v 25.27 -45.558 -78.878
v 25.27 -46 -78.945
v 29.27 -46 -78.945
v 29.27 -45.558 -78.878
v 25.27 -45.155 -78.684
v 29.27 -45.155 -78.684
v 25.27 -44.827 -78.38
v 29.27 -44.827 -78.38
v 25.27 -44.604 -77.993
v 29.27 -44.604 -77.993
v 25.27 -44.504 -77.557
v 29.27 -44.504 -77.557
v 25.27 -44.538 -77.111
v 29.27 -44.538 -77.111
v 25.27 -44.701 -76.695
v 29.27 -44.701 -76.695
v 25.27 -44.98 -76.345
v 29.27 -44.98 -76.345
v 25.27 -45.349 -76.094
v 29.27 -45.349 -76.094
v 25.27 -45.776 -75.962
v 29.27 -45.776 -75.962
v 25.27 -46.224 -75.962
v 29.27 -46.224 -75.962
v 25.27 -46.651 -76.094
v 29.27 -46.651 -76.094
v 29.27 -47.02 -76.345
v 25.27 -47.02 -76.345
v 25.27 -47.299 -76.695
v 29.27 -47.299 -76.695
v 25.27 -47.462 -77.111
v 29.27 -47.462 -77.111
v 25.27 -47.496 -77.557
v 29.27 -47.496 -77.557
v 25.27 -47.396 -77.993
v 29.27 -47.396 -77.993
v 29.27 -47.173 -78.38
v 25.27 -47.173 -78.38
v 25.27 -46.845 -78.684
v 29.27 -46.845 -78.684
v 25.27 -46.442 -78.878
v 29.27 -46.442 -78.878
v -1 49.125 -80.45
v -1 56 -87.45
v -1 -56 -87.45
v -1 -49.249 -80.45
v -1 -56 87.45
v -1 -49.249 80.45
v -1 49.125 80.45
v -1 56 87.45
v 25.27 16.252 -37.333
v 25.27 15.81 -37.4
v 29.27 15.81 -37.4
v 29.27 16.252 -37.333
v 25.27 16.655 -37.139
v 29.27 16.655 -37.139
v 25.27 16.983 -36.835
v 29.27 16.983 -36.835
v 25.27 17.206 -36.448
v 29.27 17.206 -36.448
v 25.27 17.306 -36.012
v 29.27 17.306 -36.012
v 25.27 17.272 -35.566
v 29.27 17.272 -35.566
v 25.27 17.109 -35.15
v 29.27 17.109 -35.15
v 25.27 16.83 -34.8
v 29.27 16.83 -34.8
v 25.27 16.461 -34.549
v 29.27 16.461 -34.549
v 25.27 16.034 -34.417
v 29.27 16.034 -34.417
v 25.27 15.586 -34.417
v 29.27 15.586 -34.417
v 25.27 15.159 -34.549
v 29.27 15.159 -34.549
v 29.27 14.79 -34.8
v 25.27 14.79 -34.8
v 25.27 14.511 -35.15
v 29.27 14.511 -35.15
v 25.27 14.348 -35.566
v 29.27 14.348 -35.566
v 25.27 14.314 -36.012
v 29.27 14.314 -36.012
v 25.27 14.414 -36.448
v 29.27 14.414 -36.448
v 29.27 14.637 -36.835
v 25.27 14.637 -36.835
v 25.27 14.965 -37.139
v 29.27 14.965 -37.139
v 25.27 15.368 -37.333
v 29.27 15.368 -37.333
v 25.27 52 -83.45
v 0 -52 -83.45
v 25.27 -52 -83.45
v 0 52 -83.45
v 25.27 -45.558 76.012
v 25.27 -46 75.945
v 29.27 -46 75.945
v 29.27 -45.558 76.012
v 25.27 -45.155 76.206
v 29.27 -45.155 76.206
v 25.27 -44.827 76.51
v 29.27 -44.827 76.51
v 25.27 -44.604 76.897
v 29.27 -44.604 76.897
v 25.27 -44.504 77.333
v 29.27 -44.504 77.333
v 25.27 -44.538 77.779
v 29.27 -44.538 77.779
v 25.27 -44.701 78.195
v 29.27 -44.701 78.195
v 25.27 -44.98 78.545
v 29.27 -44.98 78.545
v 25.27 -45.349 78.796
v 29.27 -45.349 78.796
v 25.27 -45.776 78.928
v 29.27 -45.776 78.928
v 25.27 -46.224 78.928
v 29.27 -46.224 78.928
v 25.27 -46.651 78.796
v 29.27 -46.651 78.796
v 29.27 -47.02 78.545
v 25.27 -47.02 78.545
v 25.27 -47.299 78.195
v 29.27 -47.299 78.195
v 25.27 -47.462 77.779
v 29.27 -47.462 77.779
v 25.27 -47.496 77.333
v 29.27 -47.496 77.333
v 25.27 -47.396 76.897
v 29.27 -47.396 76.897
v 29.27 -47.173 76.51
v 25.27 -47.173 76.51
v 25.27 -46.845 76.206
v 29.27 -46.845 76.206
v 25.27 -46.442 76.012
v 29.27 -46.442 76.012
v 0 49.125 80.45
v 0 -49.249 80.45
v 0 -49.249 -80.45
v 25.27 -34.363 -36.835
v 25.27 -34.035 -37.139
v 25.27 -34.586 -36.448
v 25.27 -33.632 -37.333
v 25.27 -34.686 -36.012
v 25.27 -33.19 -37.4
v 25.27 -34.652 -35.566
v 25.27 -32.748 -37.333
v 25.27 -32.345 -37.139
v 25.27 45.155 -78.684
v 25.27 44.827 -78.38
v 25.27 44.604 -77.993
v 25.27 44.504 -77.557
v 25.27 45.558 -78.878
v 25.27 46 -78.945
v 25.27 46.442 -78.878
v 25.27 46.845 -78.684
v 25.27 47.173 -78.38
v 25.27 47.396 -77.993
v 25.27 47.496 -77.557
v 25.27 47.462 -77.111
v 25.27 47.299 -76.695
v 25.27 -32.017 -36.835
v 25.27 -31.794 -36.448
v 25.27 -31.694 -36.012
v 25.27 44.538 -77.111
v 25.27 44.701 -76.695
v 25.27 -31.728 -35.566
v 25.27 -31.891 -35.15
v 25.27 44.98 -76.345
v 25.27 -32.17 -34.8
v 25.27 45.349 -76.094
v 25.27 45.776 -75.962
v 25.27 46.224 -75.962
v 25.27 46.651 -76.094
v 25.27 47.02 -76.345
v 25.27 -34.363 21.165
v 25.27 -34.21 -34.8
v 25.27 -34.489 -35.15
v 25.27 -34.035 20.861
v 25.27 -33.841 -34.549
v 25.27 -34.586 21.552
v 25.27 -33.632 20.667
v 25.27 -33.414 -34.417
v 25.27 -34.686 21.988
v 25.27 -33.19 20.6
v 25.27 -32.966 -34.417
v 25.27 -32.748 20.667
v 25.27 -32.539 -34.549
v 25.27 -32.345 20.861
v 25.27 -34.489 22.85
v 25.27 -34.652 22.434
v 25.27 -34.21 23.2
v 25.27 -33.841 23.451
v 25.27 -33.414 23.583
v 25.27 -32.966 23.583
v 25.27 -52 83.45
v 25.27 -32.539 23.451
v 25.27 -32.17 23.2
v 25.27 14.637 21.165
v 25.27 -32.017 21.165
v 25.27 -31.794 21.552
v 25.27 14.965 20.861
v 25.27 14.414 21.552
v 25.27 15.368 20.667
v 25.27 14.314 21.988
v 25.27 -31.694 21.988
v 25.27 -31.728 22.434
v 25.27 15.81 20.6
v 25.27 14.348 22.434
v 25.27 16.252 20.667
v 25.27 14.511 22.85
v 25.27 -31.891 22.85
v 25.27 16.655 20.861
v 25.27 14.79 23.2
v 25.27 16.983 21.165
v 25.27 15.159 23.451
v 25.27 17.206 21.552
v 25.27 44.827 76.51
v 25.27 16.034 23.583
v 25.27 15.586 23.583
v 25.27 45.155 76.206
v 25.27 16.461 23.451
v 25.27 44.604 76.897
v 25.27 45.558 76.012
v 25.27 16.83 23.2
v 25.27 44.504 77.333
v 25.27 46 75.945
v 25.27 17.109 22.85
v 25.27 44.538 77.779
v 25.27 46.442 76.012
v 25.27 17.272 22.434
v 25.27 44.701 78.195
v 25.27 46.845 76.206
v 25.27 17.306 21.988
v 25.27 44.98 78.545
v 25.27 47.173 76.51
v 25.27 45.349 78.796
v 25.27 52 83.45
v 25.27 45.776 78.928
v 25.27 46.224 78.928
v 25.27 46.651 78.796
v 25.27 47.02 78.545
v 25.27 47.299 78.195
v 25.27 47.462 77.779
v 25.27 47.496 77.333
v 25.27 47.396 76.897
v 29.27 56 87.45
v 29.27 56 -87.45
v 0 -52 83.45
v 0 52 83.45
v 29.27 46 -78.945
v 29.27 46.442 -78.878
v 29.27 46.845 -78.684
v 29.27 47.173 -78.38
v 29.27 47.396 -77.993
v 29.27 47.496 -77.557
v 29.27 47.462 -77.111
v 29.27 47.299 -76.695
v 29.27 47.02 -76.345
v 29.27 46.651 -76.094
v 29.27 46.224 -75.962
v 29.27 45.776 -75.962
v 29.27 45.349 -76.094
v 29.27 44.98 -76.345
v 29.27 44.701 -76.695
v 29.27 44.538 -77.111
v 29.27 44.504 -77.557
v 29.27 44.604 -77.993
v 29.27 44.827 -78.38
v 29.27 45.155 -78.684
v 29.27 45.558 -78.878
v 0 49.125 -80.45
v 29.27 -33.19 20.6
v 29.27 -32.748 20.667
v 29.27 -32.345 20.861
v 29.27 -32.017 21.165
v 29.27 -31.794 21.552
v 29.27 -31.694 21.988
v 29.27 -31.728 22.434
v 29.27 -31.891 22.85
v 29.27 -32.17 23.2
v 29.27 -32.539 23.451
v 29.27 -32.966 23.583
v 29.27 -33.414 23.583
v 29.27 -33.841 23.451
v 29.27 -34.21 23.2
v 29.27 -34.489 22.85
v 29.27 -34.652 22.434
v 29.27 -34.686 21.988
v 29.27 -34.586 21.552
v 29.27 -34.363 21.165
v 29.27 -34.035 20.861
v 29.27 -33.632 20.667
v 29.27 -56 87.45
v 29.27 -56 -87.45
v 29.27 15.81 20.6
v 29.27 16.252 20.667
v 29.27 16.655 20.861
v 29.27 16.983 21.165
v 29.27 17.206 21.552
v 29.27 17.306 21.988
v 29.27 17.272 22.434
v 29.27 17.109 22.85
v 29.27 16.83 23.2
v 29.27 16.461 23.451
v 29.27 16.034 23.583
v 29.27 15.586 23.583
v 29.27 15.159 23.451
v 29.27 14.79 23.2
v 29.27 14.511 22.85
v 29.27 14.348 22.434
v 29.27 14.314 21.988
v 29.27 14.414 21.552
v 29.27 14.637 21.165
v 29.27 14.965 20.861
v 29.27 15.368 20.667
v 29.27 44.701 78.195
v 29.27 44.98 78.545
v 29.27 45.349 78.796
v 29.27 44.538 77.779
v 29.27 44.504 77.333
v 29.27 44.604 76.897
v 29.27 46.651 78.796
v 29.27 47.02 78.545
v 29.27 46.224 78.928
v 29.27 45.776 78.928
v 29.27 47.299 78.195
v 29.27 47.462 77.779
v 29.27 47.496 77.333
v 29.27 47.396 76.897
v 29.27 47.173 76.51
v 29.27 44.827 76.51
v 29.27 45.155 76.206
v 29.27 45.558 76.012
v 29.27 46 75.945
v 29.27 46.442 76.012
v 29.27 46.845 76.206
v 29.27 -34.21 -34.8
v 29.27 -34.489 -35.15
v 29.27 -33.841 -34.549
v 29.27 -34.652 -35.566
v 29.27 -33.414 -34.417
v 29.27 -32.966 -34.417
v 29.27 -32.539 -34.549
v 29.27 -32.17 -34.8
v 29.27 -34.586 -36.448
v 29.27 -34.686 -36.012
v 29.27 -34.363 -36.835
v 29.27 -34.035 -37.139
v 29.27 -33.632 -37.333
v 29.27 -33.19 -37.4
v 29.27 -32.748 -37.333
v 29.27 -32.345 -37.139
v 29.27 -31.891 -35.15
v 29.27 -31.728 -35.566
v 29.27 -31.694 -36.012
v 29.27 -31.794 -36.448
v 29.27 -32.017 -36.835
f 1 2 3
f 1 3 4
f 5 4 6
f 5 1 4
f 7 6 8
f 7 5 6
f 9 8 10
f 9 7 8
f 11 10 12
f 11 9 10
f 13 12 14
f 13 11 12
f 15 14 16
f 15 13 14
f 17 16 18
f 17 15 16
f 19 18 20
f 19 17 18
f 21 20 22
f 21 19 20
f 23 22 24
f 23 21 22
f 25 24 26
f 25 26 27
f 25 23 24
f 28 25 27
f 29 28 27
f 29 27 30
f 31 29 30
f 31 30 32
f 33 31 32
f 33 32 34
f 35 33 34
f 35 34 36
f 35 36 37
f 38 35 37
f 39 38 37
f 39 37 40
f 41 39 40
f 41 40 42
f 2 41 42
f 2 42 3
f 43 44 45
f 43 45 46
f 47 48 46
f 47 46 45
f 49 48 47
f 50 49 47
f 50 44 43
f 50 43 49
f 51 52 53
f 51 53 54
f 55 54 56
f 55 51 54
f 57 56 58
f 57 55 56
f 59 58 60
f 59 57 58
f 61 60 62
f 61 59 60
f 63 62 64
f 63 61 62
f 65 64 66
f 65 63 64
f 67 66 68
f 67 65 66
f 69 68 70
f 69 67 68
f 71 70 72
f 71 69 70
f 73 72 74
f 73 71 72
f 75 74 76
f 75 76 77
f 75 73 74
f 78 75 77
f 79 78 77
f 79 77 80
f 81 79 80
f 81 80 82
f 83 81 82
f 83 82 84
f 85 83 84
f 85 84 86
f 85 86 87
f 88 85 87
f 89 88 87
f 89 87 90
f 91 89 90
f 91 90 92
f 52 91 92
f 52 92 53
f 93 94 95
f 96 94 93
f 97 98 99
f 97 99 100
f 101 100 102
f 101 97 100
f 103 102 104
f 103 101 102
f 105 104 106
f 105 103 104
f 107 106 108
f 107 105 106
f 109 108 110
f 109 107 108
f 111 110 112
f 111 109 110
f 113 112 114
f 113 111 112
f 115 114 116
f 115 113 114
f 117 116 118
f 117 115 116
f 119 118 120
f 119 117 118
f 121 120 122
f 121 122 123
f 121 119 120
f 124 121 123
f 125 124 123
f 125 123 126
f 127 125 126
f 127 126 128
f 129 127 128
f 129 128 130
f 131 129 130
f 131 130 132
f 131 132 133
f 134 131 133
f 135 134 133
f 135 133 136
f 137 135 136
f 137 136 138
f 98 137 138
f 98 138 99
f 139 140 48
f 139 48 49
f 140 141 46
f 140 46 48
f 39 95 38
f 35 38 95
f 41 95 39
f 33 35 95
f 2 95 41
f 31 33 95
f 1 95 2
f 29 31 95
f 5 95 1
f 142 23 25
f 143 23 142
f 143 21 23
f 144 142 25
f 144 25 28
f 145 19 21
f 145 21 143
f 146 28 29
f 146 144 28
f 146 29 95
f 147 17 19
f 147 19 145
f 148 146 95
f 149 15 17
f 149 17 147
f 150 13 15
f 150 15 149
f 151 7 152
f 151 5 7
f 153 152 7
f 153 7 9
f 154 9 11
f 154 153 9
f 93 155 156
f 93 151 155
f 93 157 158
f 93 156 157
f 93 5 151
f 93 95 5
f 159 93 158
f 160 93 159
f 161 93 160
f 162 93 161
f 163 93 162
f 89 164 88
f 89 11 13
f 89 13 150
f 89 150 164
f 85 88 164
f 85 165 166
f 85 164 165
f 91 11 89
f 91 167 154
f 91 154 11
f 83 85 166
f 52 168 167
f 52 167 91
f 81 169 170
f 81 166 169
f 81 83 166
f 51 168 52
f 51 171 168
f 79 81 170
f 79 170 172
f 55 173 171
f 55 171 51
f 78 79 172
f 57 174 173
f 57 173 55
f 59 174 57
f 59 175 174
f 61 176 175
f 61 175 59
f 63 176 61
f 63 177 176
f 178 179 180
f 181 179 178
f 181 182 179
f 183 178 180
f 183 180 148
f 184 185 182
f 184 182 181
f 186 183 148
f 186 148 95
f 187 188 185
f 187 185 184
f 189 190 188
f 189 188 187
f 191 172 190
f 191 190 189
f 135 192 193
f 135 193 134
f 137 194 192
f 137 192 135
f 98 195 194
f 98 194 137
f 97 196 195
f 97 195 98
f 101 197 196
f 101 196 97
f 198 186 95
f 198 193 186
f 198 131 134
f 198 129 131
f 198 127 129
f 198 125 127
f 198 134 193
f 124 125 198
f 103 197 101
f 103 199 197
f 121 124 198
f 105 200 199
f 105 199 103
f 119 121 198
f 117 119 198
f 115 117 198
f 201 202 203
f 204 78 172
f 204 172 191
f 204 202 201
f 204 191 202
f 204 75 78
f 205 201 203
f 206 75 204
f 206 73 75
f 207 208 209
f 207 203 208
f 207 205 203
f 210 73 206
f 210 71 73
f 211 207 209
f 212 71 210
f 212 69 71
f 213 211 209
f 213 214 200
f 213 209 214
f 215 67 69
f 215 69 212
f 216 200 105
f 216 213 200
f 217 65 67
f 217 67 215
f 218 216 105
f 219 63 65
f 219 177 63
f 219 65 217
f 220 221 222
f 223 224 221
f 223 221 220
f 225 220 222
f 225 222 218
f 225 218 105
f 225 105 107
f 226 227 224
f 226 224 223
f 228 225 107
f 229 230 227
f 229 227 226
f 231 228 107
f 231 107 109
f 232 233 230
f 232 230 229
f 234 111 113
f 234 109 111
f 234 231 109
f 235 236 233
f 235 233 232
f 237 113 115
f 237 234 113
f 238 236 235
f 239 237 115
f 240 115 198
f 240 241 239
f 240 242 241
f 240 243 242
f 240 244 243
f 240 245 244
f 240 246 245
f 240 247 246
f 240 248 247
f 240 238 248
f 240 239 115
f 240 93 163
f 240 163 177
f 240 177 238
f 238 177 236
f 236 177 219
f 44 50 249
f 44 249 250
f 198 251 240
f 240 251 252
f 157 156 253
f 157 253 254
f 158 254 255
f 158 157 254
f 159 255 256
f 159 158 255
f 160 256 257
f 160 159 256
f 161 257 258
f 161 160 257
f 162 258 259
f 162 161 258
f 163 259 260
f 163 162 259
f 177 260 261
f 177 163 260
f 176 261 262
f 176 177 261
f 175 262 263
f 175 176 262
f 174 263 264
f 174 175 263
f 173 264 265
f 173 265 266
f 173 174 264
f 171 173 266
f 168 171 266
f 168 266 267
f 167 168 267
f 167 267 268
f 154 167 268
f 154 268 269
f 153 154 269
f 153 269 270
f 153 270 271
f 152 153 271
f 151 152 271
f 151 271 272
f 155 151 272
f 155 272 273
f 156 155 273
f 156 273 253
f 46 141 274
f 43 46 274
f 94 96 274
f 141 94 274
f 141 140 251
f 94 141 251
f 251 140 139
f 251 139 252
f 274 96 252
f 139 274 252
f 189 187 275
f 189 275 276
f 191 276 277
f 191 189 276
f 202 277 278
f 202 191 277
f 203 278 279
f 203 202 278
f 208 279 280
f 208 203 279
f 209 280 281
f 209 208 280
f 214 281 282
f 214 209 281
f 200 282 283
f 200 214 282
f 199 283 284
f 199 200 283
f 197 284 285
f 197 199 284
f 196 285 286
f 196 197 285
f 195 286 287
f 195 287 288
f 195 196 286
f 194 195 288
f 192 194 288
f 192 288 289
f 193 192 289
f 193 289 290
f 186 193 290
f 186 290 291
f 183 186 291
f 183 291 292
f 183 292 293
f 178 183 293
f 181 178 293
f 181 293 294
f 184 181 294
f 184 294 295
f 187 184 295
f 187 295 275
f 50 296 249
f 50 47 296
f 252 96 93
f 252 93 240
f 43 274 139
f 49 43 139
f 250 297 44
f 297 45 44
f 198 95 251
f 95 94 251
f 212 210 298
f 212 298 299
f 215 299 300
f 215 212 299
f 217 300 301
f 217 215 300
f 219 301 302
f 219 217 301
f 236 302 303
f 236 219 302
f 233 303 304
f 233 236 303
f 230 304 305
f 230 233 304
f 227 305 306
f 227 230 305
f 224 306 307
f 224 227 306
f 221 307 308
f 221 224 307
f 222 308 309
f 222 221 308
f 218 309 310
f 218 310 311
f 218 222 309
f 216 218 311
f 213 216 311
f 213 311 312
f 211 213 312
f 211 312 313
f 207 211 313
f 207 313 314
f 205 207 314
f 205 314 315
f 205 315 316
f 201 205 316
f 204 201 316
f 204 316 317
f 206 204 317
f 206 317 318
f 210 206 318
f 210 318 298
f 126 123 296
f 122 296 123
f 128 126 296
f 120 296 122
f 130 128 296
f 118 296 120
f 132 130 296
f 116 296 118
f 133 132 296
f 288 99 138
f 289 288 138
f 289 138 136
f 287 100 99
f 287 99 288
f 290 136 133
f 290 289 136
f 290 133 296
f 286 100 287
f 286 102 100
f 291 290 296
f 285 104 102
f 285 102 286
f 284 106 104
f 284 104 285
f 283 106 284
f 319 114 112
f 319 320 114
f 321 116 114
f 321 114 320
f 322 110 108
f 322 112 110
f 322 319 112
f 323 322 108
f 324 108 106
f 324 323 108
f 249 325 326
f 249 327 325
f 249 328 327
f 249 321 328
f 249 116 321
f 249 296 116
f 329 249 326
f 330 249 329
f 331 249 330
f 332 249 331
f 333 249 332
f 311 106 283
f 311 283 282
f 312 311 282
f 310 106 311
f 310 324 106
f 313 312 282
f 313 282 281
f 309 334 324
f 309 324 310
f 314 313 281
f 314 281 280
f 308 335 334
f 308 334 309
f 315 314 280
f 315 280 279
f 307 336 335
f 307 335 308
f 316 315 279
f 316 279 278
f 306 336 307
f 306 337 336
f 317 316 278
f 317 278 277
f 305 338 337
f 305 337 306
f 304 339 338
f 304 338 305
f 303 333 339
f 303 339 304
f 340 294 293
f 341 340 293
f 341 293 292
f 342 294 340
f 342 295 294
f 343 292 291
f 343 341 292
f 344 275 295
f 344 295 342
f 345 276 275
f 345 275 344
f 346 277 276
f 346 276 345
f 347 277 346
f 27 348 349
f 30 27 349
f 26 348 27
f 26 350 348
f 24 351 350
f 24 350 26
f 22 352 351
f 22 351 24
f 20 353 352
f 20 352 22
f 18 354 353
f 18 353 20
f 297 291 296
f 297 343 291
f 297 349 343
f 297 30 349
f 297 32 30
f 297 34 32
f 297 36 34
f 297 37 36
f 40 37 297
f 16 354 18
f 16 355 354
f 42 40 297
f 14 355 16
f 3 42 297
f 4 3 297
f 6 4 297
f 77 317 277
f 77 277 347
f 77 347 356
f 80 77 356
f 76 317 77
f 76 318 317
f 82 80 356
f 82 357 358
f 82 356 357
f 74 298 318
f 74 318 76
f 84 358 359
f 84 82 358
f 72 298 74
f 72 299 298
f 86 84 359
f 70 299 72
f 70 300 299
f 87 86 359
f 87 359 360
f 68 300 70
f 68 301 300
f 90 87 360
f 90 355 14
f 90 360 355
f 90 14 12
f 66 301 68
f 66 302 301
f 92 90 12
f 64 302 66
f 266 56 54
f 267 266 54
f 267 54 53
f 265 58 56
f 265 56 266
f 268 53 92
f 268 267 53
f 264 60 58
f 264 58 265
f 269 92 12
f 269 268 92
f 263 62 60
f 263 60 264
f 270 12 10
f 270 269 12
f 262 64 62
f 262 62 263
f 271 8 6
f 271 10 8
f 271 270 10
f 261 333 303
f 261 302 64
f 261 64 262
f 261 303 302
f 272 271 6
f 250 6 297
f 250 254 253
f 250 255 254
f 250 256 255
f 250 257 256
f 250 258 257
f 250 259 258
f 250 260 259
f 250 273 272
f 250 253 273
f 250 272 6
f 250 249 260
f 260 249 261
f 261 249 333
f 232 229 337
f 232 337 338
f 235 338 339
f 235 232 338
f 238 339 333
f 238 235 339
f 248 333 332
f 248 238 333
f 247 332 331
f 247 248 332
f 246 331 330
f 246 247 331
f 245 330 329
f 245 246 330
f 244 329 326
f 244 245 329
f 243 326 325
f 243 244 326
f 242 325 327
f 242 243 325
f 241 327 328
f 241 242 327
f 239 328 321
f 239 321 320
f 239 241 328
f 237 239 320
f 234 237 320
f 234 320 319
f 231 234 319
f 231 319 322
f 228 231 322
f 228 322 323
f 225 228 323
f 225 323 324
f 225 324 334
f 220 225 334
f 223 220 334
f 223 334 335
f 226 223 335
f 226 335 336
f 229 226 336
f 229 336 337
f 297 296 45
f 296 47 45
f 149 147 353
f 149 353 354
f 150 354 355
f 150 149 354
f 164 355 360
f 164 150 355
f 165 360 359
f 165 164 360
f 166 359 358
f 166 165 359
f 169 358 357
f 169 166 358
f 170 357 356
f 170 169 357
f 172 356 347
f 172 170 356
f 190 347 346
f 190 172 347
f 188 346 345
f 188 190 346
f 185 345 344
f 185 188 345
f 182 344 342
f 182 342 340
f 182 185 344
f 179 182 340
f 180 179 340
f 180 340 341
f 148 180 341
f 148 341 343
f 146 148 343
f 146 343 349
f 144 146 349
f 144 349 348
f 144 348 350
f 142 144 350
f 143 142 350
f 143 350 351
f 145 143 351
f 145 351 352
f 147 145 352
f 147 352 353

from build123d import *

# Parameters (mm, degrees)
CROQUIS1_W              = 164.9
CROQUIS1_H              = 102
SALIENTE_EXTRUIR2_DEPTH = 14.27
CROQUIS2_W              = 174.9
CROQUIS2_H              = 112
CROQUIS2_W_2            = 166.9
CROQUIS2_H_2            = 104
SALIENTE_EXTRUIR3_DEPTH = 14.27
CROQUIS3_W              = 174.9
CROQUIS3_H              = 112
CROQUIS3_W_2            = 160.9
CROQUIS3_H_2            = 98.374406292
SALIENTE_EXTRUIR5_DEPTH = 1
CROQUIS4_W              = 164.9
CROQUIS4_H              = 102
CORTAR_EXTRUIR2_DEPTH   = 14.27
CROQUIS6_W              = 174.9
CROQUIS6_H              = 112
CROQUIS6_R              = 1.5
SALIENTE_EXTRUIR6_DEPTH = 15
CROQUIS8_W              = 160.9
CROQUIS8_H              = 98.374406292
CORTAR_EXTRUIR3_DEPTH   = 9
CROQUIS9_W              = 166.9
CROQUIS9_H              = 104
CORTAR_EXTRUIR5_DEPTH   = 11


with BuildPart() as part:
    # Croquis1 → Saliente-Extruir2 (new body)
    with BuildSketch(Plane(origin=(0, 0, 0), x_dir=(0, 0, -1), z_dir=(1, 0, 0))):
        Rectangle(CROQUIS1_W, CROQUIS1_H)
    extrude(amount=SALIENTE_EXTRUIR2_DEPTH)

    # Croquis4 → Cortar-Extruir2 (cut)
    with BuildSketch(Plane(origin=(14.27, 0, 0), x_dir=(0, 0, -1), z_dir=(1, 0, 0))):
        Rectangle(CROQUIS4_W, CROQUIS4_H)
    extrude(amount=-CORTAR_EXTRUIR2_DEPTH, mode=Mode.SUBTRACT)


with BuildPart() as body_2:
    # Croquis2 → Saliente-Extruir3 (new body)
    with BuildSketch(Plane(origin=(0, 0, 0), x_dir=(0, 0, -1), z_dir=(1, 0, 0))):
        Rectangle(CROQUIS2_W, CROQUIS2_H)
        Rectangle(CROQUIS2_W_2, CROQUIS2_H_2, mode=Mode.SUBTRACT)
    extrude(amount=SALIENTE_EXTRUIR3_DEPTH)

    # Croquis3 → Saliente-Extruir5 (add)
    with BuildSketch(Plane.ZY):
        Rectangle(CROQUIS3_W, CROQUIS3_H)
        with Locations((0, -0.062203146)):
            Rectangle(CROQUIS3_W_2, CROQUIS3_H_2, mode=Mode.SUBTRACT)
    extrude(amount=SALIENTE_EXTRUIR5_DEPTH)

    # Croquis6 → Saliente-Extruir6 (add)
    with BuildSketch(Plane(origin=(14.27, 0, 0), x_dir=(0, 0, -1), z_dir=(1, 0, 0))):
        Rectangle(CROQUIS6_W, CROQUIS6_H)
        with Locations((-77.445, 46)):
            Circle(CROQUIS6_R, mode=Mode.SUBTRACT)
        with Locations((-77.445, -46)):
            Circle(CROQUIS6_R, mode=Mode.SUBTRACT)
        with Locations((-22.1, 15.81)):
            Circle(CROQUIS6_R, mode=Mode.SUBTRACT)
        with Locations((35.9, 15.81)):
            Circle(CROQUIS6_R, mode=Mode.SUBTRACT)
        with Locations((-22.1, -33.19)):
            Circle(CROQUIS6_R, mode=Mode.SUBTRACT)
        with Locations((35.9, -33.19)):
            Circle(CROQUIS6_R, mode=Mode.SUBTRACT)
        with Locations((77.445, 46)):
            Circle(CROQUIS6_R, mode=Mode.SUBTRACT)
        with Locations((77.445, -46)):
            Circle(CROQUIS6_R, mode=Mode.SUBTRACT)
    extrude(amount=SALIENTE_EXTRUIR6_DEPTH)

    # Croquis8 → Cortar-Extruir3 (cut)
    with BuildSketch(Plane.ZY.offset(-14.27)):
        with Locations((0, -0.062203146)):
            Rectangle(CROQUIS8_W, CROQUIS8_H)
    extrude(amount=-CORTAR_EXTRUIR3_DEPTH, mode=Mode.SUBTRACT)

    # Croquis9 → Cortar-Extruir5 (cut)
    with BuildSketch(Plane.ZY.offset(-14.27)):
        Rectangle(CROQUIS9_W, CROQUIS9_H)
    extrude(amount=-CORTAR_EXTRUIR5_DEPTH, mode=Mode.SUBTRACT)


solid = body_2.part
